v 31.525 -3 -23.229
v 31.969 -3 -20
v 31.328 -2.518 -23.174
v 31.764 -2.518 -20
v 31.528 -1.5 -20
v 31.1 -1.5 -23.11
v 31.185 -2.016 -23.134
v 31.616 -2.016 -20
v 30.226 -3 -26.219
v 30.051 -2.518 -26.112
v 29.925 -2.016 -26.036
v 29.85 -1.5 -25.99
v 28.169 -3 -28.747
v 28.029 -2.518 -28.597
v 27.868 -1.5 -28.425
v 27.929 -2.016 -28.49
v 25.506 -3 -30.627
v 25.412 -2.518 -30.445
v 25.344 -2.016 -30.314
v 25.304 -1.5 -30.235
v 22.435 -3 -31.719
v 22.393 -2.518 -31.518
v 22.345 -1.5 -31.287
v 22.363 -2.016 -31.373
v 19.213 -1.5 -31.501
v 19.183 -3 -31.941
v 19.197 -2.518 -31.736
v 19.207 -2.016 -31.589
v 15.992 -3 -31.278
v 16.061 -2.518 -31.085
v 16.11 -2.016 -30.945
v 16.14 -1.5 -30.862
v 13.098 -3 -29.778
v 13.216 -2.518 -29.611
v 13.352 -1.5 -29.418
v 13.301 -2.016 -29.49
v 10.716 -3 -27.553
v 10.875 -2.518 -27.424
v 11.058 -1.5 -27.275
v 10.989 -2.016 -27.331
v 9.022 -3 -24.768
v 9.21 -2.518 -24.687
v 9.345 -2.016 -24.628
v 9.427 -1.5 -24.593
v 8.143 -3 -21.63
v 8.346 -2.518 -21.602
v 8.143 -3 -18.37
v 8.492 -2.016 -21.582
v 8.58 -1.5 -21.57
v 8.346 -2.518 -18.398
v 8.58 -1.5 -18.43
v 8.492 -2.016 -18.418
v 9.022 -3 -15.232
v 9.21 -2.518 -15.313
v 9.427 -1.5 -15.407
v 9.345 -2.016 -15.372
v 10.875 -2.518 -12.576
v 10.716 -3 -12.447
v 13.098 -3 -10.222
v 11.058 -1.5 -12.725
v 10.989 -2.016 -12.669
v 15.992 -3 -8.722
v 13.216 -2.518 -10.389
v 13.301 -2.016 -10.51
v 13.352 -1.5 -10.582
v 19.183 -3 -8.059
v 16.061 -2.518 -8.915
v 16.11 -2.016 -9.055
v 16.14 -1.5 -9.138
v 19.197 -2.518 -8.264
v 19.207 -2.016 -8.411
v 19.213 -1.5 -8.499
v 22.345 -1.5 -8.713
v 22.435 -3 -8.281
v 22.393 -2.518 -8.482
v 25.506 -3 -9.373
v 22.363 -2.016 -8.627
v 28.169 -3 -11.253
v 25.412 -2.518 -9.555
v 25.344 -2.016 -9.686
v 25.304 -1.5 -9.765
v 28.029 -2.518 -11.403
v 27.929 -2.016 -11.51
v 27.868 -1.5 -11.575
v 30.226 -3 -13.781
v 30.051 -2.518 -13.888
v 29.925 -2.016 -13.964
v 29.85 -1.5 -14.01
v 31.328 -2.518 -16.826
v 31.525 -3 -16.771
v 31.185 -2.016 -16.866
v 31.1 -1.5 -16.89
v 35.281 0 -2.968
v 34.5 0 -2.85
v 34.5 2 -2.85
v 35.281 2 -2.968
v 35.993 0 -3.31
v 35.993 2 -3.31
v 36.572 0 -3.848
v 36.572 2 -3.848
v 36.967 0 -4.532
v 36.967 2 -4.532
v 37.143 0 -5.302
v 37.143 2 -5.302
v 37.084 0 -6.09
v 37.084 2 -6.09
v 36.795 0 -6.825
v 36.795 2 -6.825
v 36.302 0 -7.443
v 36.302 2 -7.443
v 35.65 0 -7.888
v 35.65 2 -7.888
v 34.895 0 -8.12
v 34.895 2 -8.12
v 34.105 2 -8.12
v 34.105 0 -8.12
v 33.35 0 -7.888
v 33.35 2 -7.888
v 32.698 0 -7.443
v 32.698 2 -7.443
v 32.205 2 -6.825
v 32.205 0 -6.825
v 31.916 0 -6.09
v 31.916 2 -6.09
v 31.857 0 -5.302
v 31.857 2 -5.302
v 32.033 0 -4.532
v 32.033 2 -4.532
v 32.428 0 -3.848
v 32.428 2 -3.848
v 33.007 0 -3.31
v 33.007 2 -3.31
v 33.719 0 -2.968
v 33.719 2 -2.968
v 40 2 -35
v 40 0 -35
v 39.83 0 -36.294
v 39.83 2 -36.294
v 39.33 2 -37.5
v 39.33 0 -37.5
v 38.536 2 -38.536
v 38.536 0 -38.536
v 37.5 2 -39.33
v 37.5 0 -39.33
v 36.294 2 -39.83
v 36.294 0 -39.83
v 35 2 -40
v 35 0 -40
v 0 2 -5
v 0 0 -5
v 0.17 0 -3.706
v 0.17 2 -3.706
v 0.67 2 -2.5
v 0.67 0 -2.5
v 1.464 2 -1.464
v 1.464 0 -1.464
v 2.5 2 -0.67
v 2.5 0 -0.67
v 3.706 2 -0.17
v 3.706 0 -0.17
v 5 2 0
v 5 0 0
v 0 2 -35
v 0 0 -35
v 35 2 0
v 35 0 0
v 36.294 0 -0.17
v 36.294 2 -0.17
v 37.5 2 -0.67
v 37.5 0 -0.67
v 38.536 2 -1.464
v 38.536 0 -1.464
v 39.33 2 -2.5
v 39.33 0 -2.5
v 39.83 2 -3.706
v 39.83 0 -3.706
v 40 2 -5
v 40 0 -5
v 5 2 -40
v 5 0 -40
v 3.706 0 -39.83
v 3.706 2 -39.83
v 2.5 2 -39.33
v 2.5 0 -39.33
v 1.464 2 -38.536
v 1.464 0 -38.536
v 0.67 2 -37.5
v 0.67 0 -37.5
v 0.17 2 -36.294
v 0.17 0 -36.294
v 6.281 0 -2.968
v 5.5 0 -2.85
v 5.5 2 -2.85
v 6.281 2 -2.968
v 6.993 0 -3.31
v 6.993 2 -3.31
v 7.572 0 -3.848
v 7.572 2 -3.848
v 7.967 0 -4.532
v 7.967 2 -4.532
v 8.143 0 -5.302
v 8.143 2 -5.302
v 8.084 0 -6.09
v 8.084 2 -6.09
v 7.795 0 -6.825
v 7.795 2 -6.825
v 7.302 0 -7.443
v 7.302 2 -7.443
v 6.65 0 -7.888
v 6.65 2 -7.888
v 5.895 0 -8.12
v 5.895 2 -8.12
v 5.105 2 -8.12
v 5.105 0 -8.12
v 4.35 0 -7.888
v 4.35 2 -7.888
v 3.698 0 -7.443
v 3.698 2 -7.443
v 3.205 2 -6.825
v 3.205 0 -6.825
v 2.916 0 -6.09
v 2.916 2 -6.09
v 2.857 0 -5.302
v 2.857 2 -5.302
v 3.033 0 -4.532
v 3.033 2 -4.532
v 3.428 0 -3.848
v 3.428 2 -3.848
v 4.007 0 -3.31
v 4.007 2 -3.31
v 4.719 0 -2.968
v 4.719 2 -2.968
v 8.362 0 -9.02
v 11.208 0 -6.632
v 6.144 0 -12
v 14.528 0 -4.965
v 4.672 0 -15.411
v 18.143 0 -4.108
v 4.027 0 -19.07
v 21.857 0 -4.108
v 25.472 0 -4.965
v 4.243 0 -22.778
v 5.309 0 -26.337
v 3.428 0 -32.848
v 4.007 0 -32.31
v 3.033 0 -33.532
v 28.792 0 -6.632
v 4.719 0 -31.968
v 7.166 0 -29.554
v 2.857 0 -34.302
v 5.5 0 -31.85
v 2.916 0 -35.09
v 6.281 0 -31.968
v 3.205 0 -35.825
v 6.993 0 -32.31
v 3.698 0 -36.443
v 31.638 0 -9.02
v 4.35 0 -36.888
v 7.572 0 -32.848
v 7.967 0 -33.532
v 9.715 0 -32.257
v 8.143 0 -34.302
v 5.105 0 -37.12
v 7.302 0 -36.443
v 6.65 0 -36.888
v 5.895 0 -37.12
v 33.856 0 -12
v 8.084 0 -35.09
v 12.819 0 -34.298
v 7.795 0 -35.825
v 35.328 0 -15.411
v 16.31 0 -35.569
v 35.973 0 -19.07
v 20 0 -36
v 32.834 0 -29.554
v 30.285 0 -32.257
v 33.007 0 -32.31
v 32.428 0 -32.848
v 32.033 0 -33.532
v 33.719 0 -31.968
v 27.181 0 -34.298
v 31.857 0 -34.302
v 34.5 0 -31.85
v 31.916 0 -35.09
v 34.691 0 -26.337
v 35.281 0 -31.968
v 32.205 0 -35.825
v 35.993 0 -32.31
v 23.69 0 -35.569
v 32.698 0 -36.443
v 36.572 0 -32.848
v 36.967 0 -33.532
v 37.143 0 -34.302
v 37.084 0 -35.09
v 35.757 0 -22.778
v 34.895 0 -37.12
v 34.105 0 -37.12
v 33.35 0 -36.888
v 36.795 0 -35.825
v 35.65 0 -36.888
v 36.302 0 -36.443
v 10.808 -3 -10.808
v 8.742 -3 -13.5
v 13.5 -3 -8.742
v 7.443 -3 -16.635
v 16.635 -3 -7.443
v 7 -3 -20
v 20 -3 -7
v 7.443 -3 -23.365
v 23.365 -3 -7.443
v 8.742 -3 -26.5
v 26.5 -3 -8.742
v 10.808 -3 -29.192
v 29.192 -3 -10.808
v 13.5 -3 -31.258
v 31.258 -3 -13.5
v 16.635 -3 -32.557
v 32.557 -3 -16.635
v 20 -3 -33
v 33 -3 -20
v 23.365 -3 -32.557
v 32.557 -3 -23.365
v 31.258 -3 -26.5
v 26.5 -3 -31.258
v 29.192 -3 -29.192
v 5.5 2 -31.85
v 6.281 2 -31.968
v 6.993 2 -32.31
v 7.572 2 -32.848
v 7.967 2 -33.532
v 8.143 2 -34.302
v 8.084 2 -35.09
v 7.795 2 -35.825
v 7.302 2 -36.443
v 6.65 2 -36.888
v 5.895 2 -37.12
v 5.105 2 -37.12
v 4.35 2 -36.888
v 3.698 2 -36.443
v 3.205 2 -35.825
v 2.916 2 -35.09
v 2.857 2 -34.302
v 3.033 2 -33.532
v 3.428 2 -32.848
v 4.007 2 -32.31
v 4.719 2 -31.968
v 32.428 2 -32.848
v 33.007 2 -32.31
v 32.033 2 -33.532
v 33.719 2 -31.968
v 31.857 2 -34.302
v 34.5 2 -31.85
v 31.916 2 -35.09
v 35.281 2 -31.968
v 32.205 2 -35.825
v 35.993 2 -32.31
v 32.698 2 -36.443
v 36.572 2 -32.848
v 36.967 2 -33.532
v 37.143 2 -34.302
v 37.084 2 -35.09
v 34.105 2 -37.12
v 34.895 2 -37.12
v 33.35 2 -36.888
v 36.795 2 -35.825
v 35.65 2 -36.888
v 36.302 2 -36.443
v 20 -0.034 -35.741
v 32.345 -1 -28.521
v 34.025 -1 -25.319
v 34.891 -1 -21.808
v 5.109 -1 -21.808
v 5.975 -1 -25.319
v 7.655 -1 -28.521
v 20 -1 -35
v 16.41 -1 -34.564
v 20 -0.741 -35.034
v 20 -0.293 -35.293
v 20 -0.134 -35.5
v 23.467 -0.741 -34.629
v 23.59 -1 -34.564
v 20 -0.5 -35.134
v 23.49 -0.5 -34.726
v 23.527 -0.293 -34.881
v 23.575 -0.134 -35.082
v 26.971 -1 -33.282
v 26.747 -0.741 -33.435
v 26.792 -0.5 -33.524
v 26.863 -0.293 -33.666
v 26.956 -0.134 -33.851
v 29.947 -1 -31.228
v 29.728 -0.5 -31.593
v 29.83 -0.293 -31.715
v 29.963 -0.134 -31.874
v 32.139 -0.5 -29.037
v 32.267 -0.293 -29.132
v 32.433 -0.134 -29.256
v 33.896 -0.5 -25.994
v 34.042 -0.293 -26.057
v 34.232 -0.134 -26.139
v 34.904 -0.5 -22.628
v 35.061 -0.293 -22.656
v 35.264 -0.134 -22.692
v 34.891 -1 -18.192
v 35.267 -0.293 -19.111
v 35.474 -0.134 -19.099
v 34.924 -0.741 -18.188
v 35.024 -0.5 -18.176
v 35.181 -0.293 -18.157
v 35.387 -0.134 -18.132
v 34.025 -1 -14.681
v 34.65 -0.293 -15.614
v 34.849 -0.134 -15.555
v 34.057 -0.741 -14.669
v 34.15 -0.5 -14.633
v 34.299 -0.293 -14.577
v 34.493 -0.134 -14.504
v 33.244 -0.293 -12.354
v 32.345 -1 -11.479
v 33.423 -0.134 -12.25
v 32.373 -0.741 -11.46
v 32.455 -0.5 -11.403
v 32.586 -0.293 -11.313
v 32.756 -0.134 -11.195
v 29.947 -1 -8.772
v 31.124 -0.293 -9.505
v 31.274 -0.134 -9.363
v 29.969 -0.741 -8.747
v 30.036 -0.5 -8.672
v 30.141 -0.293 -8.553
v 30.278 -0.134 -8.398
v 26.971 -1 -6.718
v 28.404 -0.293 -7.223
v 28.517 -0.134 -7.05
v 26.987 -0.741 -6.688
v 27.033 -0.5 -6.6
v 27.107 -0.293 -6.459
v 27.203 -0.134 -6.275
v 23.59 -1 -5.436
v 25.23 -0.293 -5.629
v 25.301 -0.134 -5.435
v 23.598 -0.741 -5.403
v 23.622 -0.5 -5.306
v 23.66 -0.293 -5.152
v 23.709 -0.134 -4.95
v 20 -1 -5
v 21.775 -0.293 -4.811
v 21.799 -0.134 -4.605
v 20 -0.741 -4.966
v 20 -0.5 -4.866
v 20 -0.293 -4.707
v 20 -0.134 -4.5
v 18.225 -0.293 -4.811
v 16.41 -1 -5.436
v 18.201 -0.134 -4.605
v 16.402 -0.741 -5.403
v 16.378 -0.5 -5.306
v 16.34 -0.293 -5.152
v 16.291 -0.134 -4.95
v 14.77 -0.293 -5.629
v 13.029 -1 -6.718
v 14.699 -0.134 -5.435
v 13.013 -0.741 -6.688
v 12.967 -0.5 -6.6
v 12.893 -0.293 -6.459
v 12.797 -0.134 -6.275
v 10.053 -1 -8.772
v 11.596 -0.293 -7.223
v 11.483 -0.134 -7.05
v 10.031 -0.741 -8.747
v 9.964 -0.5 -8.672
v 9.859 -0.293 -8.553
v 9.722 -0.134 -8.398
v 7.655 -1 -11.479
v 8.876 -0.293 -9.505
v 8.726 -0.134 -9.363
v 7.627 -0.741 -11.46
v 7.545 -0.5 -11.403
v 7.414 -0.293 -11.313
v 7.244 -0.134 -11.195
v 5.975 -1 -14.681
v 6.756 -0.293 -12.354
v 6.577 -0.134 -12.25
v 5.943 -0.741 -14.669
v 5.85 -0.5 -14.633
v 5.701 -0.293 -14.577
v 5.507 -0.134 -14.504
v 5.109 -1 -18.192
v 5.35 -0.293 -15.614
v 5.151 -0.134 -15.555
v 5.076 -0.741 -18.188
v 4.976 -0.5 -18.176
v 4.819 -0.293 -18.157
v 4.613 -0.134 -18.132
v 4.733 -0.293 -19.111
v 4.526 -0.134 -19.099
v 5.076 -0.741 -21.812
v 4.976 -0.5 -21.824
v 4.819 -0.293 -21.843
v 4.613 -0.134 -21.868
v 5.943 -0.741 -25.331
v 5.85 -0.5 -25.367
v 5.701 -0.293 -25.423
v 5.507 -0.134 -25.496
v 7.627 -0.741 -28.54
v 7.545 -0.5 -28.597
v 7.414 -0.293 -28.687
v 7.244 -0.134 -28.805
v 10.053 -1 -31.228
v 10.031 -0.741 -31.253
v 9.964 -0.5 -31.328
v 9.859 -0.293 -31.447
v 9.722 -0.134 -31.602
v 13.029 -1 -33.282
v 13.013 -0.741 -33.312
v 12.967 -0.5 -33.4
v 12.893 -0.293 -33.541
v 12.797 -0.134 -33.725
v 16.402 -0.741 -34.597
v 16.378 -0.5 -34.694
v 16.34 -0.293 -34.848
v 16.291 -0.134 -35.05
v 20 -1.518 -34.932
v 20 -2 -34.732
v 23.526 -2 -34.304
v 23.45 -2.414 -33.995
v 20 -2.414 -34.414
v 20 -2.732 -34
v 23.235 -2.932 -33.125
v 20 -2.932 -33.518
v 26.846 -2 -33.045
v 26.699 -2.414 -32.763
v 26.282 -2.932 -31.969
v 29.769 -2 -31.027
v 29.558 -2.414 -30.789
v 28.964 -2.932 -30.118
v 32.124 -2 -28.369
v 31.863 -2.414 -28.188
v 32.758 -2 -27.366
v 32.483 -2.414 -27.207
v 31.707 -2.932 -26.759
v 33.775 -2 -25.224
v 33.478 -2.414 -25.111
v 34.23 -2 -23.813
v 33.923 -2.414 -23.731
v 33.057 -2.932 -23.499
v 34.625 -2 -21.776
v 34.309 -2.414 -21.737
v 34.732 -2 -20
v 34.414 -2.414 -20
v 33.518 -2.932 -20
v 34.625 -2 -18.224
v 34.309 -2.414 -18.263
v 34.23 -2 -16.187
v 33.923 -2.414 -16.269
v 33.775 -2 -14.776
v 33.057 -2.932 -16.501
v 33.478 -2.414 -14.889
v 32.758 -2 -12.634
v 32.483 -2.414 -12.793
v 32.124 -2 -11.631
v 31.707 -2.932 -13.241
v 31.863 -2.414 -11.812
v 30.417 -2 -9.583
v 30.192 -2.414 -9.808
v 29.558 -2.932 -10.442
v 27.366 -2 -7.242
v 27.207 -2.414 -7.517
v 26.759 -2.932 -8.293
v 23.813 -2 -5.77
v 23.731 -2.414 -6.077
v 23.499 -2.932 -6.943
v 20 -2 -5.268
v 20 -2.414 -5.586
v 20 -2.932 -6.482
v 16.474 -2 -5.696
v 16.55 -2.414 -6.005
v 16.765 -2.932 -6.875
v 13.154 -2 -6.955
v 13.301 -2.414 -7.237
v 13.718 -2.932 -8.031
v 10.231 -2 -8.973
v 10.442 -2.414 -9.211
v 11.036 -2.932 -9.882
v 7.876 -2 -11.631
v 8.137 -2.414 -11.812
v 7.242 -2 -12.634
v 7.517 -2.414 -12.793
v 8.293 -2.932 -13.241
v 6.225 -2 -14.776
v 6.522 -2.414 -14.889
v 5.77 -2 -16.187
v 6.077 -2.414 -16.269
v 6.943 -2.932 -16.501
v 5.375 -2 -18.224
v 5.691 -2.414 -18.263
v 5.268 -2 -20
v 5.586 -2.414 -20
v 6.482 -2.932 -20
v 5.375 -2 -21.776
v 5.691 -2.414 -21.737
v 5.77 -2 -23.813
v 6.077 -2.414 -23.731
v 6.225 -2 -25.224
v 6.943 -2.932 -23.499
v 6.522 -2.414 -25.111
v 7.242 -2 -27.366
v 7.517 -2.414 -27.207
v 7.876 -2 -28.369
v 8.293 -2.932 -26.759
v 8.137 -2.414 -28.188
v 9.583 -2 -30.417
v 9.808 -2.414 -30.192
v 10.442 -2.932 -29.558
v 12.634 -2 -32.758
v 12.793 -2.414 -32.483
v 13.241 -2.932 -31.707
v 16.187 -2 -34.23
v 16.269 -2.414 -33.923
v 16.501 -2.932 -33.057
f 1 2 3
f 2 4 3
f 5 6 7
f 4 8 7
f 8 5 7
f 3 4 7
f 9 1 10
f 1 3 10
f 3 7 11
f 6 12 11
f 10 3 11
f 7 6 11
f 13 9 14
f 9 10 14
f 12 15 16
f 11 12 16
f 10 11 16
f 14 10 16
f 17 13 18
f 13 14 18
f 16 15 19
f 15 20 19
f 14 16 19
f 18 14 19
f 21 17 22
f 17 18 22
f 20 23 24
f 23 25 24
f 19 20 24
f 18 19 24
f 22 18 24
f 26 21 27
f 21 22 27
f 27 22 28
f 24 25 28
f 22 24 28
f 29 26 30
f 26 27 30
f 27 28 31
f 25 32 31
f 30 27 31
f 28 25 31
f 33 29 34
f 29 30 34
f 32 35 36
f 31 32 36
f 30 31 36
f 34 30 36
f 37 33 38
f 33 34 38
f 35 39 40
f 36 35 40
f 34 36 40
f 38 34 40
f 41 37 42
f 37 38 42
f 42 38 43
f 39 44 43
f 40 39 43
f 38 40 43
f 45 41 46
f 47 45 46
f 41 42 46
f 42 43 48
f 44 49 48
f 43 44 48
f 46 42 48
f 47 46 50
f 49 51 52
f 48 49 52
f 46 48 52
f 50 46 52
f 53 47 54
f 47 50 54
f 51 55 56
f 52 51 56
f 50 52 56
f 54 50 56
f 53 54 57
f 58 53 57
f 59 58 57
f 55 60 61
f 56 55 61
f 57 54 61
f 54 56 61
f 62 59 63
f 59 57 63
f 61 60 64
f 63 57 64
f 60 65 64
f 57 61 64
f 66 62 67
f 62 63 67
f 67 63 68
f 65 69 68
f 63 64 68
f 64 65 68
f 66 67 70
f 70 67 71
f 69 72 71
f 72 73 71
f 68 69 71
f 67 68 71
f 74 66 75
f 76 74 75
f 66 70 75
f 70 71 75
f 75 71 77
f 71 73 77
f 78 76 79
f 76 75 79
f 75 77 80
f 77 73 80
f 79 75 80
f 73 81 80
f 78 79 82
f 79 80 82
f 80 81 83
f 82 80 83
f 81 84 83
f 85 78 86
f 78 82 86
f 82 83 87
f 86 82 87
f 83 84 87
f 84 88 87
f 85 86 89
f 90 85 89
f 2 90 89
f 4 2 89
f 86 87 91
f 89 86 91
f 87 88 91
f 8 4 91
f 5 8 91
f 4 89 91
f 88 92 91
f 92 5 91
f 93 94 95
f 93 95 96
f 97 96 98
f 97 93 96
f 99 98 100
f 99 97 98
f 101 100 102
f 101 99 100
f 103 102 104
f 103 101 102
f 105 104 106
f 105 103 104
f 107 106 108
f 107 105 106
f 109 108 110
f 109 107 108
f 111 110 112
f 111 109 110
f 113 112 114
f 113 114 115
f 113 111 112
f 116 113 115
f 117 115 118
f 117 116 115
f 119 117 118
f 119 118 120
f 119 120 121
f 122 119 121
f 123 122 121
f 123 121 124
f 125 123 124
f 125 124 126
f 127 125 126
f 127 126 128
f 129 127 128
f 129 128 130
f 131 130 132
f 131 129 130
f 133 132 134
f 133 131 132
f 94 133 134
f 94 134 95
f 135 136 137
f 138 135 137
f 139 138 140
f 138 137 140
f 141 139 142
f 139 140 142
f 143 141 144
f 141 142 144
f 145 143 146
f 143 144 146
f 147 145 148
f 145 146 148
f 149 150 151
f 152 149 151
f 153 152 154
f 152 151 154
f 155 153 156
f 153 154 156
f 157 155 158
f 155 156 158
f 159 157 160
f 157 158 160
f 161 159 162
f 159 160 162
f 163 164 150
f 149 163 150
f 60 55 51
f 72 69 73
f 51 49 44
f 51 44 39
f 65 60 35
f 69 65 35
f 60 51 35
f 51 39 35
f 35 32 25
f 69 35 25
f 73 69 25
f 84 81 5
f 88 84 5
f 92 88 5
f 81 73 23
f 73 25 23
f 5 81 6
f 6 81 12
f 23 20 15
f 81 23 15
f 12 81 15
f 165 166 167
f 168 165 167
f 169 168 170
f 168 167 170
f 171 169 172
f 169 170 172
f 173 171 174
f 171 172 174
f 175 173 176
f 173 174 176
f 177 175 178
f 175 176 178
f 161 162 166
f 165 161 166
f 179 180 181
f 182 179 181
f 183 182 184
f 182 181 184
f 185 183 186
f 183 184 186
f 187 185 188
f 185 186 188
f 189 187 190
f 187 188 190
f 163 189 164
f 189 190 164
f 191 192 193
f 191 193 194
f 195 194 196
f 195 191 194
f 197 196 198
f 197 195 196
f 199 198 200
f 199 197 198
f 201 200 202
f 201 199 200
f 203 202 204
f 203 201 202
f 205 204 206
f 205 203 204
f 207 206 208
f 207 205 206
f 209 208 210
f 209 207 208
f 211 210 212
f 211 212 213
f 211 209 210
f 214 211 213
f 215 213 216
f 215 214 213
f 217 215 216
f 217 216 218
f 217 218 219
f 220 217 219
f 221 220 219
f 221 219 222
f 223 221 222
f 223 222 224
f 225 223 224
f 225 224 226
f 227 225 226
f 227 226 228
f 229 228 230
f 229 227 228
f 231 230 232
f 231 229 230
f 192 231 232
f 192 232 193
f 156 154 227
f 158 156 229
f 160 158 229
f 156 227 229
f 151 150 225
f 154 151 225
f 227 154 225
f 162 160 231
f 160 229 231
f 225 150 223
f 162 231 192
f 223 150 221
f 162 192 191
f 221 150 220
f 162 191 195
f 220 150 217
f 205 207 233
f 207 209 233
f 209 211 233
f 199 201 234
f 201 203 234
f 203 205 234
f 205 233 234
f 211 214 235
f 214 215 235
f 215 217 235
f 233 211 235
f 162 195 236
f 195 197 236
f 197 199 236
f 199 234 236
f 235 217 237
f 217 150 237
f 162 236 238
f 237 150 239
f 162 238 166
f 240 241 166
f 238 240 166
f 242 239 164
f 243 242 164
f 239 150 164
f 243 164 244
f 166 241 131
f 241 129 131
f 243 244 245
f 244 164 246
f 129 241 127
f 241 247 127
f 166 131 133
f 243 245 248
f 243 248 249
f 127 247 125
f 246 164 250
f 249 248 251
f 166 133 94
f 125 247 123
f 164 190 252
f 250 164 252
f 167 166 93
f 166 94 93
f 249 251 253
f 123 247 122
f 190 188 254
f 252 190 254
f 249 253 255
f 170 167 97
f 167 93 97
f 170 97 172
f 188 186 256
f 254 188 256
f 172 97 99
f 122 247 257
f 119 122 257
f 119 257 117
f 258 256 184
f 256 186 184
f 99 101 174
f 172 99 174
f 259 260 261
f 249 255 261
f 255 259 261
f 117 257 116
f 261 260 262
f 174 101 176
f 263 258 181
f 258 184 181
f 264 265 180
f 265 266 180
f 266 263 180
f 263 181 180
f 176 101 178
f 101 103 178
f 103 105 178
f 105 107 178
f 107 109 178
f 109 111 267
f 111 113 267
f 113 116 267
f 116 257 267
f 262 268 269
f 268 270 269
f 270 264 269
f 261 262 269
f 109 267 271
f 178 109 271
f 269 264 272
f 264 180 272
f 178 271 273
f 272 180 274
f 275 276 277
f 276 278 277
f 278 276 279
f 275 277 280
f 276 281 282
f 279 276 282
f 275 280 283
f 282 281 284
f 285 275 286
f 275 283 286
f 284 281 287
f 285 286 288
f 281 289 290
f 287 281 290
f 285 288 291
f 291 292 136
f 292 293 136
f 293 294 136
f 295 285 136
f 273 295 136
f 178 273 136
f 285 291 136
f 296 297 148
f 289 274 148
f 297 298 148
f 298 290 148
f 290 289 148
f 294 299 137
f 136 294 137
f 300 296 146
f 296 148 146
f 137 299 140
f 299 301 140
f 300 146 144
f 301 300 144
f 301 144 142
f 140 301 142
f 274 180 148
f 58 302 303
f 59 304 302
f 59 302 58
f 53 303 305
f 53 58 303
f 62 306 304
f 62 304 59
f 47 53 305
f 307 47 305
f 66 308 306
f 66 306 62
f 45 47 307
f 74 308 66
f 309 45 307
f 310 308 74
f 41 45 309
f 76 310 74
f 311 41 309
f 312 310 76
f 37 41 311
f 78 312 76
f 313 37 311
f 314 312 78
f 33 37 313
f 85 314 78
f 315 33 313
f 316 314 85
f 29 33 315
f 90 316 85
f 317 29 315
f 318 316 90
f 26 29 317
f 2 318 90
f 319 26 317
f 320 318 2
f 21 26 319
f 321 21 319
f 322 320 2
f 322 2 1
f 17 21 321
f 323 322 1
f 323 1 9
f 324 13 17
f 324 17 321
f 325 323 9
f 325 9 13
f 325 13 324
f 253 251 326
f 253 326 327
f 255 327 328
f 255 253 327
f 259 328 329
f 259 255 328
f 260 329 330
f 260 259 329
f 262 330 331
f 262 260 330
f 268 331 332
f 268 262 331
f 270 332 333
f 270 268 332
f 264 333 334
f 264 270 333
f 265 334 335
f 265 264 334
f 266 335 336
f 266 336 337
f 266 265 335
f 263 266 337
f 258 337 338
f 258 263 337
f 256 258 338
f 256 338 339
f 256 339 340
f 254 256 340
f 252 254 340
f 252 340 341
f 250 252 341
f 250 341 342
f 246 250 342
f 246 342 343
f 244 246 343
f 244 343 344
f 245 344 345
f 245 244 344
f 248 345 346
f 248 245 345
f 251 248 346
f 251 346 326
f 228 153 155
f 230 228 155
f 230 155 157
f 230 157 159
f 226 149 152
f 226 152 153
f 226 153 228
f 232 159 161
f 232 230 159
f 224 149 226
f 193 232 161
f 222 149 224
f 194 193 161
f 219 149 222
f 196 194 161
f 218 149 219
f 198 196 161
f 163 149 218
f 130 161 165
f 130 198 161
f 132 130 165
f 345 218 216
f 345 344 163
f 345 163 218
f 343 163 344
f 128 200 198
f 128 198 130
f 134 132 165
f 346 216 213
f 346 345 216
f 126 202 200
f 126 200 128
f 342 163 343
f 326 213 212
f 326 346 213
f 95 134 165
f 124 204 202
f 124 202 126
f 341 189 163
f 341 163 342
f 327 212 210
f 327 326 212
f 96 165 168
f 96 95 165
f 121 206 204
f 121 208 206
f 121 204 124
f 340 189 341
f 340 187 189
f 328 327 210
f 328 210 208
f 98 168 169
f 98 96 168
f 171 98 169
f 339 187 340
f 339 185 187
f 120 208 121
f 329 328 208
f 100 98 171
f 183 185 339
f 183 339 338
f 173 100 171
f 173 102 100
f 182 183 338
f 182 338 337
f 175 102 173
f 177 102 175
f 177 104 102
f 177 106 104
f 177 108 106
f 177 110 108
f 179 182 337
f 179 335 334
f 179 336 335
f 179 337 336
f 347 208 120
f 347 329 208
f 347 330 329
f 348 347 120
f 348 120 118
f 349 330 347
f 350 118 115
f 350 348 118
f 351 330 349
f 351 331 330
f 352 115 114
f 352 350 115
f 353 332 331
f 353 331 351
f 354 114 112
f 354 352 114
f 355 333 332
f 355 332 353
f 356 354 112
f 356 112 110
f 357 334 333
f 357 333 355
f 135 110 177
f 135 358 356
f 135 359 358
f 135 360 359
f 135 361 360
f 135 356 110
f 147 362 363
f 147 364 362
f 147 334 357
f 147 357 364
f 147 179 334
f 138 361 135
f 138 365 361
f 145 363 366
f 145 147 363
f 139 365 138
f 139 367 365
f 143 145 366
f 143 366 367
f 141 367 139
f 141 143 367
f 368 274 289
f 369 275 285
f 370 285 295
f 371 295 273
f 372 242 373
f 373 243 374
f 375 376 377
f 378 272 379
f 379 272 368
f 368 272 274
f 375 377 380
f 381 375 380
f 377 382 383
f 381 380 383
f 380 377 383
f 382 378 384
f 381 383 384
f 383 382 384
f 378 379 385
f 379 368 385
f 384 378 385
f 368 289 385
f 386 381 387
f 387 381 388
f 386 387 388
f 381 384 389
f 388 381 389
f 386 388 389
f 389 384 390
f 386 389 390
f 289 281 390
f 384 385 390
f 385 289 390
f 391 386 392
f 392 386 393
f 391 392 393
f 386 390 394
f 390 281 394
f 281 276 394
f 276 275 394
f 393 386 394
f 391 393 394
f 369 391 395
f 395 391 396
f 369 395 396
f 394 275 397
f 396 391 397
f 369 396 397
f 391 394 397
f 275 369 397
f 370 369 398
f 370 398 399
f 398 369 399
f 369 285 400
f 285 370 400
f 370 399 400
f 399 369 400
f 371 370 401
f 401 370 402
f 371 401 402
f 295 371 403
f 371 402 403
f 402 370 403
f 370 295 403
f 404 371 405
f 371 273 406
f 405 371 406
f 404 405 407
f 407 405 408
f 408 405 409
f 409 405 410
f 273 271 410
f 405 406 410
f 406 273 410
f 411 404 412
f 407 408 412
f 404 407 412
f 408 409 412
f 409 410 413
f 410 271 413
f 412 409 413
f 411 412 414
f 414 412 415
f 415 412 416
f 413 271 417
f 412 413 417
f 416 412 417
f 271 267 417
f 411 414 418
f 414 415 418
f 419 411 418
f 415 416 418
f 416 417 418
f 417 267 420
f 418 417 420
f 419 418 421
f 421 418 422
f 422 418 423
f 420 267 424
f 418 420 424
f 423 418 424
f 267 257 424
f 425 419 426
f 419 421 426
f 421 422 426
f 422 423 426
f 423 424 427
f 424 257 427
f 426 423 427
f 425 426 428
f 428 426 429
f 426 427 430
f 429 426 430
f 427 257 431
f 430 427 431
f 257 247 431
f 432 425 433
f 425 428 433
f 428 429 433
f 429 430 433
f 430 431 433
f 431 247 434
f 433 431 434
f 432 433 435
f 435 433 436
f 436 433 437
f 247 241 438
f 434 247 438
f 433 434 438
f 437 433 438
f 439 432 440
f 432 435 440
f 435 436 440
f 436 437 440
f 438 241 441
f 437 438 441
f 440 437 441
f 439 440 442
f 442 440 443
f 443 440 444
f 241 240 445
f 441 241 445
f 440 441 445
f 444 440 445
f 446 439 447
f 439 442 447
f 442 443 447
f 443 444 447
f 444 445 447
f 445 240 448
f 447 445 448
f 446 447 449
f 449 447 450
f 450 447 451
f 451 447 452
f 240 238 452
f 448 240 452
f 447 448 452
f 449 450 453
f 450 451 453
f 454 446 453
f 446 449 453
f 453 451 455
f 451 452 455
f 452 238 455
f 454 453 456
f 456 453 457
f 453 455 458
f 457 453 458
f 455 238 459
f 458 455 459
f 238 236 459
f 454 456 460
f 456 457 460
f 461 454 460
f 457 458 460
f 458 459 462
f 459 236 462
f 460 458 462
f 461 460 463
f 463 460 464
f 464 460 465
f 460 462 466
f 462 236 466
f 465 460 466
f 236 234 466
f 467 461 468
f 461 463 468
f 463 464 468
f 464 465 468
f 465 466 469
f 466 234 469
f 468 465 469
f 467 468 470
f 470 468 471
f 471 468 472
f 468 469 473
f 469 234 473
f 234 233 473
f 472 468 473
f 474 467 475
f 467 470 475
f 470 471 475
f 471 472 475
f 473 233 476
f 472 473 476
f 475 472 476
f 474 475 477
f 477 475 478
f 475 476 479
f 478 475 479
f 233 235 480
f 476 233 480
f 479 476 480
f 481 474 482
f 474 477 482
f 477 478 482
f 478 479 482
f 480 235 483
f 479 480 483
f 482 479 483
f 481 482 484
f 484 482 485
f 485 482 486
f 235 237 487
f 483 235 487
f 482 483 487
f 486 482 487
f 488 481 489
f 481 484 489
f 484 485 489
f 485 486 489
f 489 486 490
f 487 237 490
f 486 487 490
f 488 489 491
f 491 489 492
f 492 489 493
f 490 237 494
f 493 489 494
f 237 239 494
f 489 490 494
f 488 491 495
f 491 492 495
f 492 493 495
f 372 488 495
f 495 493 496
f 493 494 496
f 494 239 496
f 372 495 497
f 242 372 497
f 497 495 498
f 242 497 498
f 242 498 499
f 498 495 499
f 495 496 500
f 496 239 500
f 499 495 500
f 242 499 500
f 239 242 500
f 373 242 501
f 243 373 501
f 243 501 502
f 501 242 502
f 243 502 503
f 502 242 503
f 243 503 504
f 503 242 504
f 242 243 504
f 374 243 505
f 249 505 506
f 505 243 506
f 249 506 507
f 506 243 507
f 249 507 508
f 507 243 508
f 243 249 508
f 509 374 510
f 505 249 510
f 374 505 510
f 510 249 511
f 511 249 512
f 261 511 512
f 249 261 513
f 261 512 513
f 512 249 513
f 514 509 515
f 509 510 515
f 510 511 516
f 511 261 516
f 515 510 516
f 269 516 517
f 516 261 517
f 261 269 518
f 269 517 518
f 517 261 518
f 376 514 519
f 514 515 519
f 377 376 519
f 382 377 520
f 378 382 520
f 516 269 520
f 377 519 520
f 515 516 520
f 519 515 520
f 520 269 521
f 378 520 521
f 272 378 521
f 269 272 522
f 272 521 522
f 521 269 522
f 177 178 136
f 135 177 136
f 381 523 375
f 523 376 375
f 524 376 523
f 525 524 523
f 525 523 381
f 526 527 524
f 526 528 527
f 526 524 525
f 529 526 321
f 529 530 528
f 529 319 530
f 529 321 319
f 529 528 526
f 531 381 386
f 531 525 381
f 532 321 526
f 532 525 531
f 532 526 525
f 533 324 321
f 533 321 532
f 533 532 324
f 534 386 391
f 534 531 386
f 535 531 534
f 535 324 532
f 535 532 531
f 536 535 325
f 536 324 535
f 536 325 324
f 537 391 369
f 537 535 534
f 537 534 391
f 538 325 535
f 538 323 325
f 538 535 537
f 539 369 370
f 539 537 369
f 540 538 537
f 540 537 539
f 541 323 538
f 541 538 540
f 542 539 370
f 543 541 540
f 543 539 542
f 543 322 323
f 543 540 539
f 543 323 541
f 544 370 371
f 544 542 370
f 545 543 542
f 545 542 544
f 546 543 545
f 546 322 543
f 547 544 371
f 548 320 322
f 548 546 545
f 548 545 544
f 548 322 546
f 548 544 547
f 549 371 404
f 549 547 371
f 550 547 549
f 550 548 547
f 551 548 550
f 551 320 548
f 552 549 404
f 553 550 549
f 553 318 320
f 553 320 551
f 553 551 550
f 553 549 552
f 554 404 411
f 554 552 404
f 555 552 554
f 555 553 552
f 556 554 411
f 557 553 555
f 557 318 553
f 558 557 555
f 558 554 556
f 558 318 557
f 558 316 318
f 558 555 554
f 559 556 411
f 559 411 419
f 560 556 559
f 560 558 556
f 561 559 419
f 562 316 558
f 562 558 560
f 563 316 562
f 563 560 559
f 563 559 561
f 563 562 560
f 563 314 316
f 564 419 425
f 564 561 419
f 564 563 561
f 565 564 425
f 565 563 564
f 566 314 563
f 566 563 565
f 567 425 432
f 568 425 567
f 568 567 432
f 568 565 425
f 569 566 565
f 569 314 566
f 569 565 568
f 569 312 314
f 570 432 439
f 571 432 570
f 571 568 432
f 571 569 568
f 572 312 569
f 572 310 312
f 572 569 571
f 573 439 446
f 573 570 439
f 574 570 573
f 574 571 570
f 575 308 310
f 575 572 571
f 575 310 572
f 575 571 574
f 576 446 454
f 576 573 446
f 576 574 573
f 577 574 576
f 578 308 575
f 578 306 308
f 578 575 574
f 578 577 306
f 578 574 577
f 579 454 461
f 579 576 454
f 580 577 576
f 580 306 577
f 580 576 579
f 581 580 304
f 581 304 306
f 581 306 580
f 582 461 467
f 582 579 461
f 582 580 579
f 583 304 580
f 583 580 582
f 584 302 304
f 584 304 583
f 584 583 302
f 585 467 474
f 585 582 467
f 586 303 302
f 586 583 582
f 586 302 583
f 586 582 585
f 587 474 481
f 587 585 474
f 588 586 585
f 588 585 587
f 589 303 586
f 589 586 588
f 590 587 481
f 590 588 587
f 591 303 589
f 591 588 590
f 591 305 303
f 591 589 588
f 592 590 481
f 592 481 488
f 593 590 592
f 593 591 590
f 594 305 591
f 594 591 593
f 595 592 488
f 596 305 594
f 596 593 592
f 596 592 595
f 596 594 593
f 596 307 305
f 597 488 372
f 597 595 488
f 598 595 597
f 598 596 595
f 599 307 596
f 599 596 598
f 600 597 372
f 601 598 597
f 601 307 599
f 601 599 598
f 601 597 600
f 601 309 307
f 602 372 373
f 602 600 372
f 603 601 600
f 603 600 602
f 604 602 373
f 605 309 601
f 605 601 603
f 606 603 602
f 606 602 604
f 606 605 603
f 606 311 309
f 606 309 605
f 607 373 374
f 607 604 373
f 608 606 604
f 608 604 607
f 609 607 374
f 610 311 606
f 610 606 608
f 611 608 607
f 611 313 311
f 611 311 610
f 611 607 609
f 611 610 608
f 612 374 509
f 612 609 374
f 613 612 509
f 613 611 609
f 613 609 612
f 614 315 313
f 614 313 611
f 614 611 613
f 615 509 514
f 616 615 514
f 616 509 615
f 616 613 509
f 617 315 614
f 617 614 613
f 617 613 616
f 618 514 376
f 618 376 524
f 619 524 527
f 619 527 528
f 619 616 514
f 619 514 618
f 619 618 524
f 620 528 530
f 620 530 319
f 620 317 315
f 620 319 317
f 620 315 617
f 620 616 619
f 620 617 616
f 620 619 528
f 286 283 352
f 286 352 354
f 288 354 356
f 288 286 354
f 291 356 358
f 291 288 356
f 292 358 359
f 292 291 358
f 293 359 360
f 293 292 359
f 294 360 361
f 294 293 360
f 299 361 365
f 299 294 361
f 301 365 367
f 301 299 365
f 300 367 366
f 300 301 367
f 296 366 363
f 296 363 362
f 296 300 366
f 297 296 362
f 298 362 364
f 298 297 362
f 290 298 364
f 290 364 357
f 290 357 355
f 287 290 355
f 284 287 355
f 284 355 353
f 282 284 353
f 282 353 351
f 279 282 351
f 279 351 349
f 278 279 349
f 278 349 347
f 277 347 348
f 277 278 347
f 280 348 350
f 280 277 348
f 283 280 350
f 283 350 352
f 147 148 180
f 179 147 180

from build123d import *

# Parameters (mm, degrees)
SKETCH1_R           = 2.65
BOSS_EXTRUDE1_DEPTH = 2
SKETCH4_R           = 15
BOSS_EXTRUDE2_DEPTH = 3
FILLET1_R           = 2
FILLET2_R           = 1


# Read off the part's stored shape, not the designer's step: Shell2
with BuildPart() as part:
    # Sketch1 → Boss-Extrude1 (new body)
    with BuildSketch(Plane(origin=(0, 0, 0), x_dir=(1, 0, 0), z_dir=(0, 1, 0))):
        with BuildLine():
            Line((5, 0), (35, 0))
            ThreePointArc((35, 0), (38.535533906, 1.464466094), (40, 5))
            Line((40, 5), (40, 35))
            ThreePointArc((40, 35), (38.535533906, 38.535533906), (35, 40))
            Line((35, 40), (5, 40))
            ThreePointArc((5, 40), (1.464466094, 38.535533906), (0, 35))
            Line((0, 35), (0, 5))
            ThreePointArc((0, 5), (1.464466094, 1.464466094), (5, 0))
        make_face()
        with Locations(Location((5.5, 34.5, 0), (0, 0, 270))):
            Circle(SKETCH1_R, mode=Mode.SUBTRACT)
        with Locations(Location((34.5, 34.5, 0), (0, 0, 270))):
            Circle(SKETCH1_R, mode=Mode.SUBTRACT)
        with Locations(Location((34.5, 5.5, 0), (0, 0, 270))):
            Circle(SKETCH1_R, mode=Mode.SUBTRACT)
        with Locations(Location((5.5, 5.5, 0), (0, 0, 270))):
            Circle(SKETCH1_R, mode=Mode.SUBTRACT)
    extrude(amount=BOSS_EXTRUDE1_DEPTH)

    # Sketch4 → Boss-Extrude2 (add)
    with BuildSketch(Plane.XZ):
        with Locations(Location((20, -20, 0), (0, 0, 270))):
            Circle(SKETCH4_R)
    extrude(amount=BOSS_EXTRUDE2_DEPTH)

    # Fillet1
    fillet1_edges = [part.edges().sort_by_distance(p)[0] for p in [
        (20, -3, -5),
    ]]
    fillet(fillet1_edges, radius=FILLET1_R)

    # Fillet2
    fillet2_edges = [part.edges().sort_by_distance(p)[0] for p in [
        (20, 0, -5),
    ]]
    fillet(fillet2_edges, radius=FILLET2_R - 0.0001)  # a hair under: the kernel refuses the full size

    # Shell2 outline → Shell2 (revolve, cut)
    with BuildSketch(Plane(origin=(20, 0, -20), x_dir=(1, 0, 0), z_dir=(0, 0, 1))):
        with BuildLine():
            Line((0, -3), (11.968871126, -3))
            ThreePointArc((11.968871126, -3), (11.68272329, -2.269299733), (11.527864045, -1.5))
            Line((11.527864045, -1.5), (0, -1.5))
            Line((0, -1.5), (0, -3))
        make_face()
    revolve(axis=Axis((20, 0, -20), (0, 1, 0)), mode=Mode.SUBTRACT)


solid = part.part
